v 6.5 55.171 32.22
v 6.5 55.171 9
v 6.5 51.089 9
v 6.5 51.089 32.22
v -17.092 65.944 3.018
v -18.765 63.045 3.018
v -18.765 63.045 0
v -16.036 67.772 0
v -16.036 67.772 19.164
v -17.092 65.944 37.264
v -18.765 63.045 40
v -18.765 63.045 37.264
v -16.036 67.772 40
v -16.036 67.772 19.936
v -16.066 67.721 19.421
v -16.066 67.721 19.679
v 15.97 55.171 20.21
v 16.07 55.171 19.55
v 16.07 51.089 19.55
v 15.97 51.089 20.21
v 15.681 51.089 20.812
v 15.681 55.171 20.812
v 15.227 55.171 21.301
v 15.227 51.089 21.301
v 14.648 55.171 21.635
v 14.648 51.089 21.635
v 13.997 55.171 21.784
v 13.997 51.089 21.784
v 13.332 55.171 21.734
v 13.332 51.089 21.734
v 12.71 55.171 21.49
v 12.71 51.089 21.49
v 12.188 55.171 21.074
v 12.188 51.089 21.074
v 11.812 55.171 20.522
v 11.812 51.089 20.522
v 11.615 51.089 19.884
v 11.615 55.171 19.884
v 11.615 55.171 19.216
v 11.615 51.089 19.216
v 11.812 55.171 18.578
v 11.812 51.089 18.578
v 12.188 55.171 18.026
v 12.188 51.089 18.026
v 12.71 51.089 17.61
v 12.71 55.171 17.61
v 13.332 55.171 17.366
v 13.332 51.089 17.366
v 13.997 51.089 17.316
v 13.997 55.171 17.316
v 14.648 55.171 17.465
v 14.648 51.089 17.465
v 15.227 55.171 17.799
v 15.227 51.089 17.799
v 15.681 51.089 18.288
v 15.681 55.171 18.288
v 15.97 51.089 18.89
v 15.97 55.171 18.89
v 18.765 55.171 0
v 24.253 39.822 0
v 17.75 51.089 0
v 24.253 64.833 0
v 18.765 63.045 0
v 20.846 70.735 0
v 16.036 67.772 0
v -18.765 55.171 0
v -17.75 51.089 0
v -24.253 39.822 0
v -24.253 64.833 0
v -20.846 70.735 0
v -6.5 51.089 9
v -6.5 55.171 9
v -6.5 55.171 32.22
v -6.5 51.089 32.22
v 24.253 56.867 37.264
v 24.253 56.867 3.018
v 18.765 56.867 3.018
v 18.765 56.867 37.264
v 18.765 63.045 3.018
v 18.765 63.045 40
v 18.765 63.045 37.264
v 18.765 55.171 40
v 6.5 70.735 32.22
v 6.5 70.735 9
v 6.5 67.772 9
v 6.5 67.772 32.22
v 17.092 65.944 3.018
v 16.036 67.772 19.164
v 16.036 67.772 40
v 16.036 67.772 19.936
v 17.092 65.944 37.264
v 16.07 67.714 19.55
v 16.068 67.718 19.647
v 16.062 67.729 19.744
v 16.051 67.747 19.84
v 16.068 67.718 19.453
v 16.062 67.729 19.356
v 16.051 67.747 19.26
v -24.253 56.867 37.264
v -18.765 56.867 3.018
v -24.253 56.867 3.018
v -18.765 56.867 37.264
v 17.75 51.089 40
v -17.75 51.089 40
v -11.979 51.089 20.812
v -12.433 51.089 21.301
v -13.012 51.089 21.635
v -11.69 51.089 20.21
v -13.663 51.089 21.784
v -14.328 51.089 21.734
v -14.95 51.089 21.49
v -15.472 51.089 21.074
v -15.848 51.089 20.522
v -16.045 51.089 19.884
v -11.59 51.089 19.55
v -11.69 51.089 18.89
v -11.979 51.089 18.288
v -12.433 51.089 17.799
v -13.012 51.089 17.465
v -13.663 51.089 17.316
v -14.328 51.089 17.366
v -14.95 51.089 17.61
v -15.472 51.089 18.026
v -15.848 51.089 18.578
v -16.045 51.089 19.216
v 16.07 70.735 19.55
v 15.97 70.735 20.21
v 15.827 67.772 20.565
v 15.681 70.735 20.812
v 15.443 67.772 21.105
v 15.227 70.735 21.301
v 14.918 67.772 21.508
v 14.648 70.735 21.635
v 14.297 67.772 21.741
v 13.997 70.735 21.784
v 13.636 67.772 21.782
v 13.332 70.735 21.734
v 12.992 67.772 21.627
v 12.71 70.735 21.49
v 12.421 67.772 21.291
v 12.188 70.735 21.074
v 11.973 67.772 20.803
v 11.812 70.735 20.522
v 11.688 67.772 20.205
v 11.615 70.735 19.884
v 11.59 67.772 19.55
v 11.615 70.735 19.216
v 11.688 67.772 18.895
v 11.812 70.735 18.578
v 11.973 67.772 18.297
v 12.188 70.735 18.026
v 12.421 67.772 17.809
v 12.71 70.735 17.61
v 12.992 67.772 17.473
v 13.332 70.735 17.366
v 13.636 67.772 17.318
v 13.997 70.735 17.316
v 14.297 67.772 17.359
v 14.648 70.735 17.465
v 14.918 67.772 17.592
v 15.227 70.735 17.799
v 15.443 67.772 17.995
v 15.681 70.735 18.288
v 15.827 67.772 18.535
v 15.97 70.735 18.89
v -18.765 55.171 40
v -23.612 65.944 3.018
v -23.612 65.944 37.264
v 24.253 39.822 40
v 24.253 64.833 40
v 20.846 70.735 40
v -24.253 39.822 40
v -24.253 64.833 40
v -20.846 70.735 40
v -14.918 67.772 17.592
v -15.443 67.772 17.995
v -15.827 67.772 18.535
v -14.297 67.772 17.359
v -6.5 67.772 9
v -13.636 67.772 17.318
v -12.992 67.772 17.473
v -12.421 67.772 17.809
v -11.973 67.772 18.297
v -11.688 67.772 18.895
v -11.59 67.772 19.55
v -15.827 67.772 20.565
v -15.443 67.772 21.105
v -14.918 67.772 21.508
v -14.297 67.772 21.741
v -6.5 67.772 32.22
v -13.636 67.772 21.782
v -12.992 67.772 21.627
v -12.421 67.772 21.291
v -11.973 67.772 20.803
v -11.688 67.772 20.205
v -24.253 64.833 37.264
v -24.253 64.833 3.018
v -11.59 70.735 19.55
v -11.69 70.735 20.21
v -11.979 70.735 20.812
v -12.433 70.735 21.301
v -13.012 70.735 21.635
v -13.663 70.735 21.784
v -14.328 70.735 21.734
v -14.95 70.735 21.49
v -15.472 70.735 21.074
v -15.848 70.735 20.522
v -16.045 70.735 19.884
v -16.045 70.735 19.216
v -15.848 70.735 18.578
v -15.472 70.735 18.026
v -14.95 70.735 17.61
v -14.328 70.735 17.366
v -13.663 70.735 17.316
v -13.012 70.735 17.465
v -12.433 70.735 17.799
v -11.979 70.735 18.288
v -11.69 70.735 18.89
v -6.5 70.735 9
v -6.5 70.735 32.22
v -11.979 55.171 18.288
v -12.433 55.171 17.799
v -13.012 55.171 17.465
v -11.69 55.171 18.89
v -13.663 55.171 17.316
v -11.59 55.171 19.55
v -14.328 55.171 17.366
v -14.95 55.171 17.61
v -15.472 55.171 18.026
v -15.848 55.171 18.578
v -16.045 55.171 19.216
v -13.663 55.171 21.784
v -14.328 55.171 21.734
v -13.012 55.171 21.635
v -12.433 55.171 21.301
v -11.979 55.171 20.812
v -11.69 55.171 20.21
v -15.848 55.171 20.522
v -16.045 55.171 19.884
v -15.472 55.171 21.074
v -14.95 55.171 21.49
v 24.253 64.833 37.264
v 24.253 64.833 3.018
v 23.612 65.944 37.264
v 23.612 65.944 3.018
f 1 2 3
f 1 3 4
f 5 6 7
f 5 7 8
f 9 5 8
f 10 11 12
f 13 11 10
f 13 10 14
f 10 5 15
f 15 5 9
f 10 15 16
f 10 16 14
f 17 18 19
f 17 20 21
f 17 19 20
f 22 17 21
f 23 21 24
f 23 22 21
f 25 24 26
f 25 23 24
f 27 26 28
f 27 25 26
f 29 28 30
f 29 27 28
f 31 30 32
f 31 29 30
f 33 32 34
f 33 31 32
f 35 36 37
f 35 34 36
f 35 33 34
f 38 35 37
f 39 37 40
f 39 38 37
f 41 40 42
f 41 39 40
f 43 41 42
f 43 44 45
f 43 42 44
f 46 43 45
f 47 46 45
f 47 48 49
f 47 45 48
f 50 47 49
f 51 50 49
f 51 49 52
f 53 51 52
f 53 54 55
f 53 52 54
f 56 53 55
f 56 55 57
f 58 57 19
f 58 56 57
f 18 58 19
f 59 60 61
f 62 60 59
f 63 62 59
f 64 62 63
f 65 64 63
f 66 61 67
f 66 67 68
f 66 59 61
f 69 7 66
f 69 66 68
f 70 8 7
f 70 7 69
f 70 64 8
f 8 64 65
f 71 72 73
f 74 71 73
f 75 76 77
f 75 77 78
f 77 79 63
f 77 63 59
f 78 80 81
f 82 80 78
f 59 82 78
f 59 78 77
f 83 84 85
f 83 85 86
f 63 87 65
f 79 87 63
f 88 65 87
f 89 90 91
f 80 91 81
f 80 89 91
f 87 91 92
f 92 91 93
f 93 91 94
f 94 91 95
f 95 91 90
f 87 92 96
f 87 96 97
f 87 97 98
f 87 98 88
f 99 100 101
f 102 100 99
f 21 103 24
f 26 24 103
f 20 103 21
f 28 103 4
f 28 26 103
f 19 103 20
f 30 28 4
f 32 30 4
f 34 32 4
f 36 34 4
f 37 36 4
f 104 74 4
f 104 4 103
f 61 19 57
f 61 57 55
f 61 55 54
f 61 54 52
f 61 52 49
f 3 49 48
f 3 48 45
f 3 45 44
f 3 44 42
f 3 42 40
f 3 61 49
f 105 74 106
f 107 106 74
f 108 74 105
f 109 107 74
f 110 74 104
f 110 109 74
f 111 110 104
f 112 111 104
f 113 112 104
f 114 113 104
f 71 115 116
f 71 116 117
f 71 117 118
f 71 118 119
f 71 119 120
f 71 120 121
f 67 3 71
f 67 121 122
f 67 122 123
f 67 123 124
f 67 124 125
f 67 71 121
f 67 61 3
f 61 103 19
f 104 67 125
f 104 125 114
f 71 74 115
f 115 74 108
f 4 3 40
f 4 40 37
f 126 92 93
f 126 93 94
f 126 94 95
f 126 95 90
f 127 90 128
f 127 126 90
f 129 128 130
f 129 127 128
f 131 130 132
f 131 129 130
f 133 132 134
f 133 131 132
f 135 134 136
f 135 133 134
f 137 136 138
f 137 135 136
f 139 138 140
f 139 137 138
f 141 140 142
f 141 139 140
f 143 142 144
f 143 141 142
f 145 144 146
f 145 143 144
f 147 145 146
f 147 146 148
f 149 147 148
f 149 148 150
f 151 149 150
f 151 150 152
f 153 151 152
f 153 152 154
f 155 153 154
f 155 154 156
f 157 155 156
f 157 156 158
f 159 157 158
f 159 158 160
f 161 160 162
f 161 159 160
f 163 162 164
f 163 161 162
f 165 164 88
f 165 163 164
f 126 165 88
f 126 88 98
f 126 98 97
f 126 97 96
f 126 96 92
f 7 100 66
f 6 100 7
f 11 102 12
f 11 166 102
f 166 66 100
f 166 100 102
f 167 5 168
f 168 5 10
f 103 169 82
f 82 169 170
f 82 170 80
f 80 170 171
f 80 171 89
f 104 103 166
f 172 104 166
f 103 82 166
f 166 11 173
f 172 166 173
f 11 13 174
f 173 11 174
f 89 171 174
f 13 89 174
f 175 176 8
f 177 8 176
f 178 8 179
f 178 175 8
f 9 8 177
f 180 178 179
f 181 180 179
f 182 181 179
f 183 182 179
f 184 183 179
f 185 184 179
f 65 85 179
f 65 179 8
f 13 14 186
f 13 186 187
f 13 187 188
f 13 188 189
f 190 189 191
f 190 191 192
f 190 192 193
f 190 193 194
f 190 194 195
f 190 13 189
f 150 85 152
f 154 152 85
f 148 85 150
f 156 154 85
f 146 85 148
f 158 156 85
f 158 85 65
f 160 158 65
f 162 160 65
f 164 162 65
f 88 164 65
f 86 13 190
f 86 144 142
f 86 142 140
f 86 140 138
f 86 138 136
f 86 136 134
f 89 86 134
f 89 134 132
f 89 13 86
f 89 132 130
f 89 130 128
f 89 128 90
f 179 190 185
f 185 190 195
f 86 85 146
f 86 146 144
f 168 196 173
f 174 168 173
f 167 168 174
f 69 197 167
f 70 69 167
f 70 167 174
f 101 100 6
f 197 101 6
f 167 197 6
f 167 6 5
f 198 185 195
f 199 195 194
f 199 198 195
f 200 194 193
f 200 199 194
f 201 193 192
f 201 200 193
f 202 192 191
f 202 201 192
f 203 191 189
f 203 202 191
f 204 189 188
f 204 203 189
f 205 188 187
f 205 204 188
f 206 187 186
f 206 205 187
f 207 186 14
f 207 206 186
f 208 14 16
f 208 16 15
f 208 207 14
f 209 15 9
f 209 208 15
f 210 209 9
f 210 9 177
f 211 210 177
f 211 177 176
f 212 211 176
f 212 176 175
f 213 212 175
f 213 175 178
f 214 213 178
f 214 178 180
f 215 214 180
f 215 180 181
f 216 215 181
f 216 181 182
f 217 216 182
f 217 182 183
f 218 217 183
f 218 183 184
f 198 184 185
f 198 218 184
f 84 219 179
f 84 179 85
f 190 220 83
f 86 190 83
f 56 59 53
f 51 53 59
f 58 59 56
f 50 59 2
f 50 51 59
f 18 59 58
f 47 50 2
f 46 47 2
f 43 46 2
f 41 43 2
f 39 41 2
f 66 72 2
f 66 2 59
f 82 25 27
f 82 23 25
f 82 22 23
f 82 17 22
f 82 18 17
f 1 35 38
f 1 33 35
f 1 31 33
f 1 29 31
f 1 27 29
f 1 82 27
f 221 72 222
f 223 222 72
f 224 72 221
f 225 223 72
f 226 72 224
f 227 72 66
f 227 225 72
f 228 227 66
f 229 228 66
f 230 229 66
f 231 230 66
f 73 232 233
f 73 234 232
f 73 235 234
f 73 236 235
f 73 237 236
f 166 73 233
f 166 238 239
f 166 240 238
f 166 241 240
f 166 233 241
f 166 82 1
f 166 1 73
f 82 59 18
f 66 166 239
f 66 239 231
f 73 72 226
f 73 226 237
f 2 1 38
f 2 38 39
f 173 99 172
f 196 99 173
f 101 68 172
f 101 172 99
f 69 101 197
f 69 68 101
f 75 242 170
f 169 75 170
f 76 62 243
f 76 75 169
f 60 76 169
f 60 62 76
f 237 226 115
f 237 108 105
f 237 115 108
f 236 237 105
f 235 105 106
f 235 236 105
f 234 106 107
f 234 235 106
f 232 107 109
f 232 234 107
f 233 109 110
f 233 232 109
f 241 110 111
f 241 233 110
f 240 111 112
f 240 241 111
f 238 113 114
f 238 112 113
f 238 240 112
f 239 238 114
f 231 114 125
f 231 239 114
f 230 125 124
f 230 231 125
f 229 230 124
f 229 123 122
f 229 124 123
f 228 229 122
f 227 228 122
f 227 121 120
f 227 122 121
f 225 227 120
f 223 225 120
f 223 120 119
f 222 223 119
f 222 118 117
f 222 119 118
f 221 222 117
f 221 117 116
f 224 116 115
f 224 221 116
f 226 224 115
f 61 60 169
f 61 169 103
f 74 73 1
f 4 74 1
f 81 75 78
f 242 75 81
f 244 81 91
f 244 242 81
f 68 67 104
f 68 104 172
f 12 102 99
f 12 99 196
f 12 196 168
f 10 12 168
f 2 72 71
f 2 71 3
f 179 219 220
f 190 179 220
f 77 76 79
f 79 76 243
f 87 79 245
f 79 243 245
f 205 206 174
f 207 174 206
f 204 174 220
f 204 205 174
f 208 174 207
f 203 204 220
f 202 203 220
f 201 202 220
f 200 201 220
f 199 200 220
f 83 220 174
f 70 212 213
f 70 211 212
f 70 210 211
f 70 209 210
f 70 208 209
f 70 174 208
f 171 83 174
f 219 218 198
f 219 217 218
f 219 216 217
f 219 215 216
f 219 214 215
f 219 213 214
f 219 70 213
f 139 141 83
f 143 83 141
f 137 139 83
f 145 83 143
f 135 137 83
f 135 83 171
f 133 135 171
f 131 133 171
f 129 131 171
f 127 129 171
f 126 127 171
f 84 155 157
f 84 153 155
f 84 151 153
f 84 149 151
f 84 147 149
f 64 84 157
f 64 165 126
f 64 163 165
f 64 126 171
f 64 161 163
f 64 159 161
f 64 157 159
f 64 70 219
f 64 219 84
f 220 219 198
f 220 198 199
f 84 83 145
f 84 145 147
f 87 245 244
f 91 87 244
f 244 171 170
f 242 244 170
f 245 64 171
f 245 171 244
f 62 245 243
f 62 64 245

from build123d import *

# Parameters (mm, degrees)
PAD017_DEPTH       = 40
SKETCH041_W        = 13
SKETCH041_H        = 23.22
POCKET003014_DEPTH = 31.179264
POCKET003015_DEPTH = 40.001
SKETCH043_W        = 9.077184
SKETCH043_H        = 34.246025
POCKET003016_DEPTH = 49.253641
SKETCH050_R        = 2.24
POCKET003019_DEPTH = 31.179264


with BuildPart() as part:
    # Sketch040 → Pad017 (new body)
    with BuildSketch(Plane.XY):
        Polygon((-20.846346, 70.735185), (20.846346, 70.735185), (24.252641, 64.833161), (24.252641, 39.821736), (17.75, 51.08874), (-17.75, 51.08874), (-24.252641, 39.821736), (-24.252641, 64.833161), align=None)
    extrude(amount=PAD017_DEPTH)

    # Sketch041 → Pocket003014 (cut, through all)
    with BuildSketch(Plane.XZ.offset(-71)):
        with Locations((0, 20.61)):
            Rectangle(SKETCH041_W, SKETCH041_H)
    extrude(amount=POCKET003014_DEPTH, mode=Mode.SUBTRACT)

    # Sketch042 → Pocket003015 (cut, through all)
    with BuildSketch(Plane.XY.offset(40)):
        Polygon((-16.036429, 67.772269), (16.036429, 67.772269), (18.76456, 63.045287), (18.76456, 55.171417), (-18.76456, 55.171417), (-18.76456, 63.045287), align=None)
    extrude(amount=-POCKET003015_DEPTH, mode=Mode.SUBTRACT)

    # Sketch043 → Pocket003016 (cut, through all)
    with BuildSketch(Plane.YZ.offset(25)):
        with Locations((61.40538, 20.140725)):
            Rectangle(SKETCH043_W, SKETCH043_H)
    extrude(amount=-POCKET003016_DEPTH, mode=Mode.SUBTRACT)

    # Sketch050 → Pocket003019 (cut, through all)
    with BuildSketch(Plane.XZ.offset(-71)):
        with Locations((-13.83, 19.55)):
            Circle(SKETCH050_R)
        with Locations((13.83, 19.55)):
            Circle(SKETCH050_R)
    extrude(amount=POCKET003019_DEPTH, mode=Mode.SUBTRACT)


solid = part.part
